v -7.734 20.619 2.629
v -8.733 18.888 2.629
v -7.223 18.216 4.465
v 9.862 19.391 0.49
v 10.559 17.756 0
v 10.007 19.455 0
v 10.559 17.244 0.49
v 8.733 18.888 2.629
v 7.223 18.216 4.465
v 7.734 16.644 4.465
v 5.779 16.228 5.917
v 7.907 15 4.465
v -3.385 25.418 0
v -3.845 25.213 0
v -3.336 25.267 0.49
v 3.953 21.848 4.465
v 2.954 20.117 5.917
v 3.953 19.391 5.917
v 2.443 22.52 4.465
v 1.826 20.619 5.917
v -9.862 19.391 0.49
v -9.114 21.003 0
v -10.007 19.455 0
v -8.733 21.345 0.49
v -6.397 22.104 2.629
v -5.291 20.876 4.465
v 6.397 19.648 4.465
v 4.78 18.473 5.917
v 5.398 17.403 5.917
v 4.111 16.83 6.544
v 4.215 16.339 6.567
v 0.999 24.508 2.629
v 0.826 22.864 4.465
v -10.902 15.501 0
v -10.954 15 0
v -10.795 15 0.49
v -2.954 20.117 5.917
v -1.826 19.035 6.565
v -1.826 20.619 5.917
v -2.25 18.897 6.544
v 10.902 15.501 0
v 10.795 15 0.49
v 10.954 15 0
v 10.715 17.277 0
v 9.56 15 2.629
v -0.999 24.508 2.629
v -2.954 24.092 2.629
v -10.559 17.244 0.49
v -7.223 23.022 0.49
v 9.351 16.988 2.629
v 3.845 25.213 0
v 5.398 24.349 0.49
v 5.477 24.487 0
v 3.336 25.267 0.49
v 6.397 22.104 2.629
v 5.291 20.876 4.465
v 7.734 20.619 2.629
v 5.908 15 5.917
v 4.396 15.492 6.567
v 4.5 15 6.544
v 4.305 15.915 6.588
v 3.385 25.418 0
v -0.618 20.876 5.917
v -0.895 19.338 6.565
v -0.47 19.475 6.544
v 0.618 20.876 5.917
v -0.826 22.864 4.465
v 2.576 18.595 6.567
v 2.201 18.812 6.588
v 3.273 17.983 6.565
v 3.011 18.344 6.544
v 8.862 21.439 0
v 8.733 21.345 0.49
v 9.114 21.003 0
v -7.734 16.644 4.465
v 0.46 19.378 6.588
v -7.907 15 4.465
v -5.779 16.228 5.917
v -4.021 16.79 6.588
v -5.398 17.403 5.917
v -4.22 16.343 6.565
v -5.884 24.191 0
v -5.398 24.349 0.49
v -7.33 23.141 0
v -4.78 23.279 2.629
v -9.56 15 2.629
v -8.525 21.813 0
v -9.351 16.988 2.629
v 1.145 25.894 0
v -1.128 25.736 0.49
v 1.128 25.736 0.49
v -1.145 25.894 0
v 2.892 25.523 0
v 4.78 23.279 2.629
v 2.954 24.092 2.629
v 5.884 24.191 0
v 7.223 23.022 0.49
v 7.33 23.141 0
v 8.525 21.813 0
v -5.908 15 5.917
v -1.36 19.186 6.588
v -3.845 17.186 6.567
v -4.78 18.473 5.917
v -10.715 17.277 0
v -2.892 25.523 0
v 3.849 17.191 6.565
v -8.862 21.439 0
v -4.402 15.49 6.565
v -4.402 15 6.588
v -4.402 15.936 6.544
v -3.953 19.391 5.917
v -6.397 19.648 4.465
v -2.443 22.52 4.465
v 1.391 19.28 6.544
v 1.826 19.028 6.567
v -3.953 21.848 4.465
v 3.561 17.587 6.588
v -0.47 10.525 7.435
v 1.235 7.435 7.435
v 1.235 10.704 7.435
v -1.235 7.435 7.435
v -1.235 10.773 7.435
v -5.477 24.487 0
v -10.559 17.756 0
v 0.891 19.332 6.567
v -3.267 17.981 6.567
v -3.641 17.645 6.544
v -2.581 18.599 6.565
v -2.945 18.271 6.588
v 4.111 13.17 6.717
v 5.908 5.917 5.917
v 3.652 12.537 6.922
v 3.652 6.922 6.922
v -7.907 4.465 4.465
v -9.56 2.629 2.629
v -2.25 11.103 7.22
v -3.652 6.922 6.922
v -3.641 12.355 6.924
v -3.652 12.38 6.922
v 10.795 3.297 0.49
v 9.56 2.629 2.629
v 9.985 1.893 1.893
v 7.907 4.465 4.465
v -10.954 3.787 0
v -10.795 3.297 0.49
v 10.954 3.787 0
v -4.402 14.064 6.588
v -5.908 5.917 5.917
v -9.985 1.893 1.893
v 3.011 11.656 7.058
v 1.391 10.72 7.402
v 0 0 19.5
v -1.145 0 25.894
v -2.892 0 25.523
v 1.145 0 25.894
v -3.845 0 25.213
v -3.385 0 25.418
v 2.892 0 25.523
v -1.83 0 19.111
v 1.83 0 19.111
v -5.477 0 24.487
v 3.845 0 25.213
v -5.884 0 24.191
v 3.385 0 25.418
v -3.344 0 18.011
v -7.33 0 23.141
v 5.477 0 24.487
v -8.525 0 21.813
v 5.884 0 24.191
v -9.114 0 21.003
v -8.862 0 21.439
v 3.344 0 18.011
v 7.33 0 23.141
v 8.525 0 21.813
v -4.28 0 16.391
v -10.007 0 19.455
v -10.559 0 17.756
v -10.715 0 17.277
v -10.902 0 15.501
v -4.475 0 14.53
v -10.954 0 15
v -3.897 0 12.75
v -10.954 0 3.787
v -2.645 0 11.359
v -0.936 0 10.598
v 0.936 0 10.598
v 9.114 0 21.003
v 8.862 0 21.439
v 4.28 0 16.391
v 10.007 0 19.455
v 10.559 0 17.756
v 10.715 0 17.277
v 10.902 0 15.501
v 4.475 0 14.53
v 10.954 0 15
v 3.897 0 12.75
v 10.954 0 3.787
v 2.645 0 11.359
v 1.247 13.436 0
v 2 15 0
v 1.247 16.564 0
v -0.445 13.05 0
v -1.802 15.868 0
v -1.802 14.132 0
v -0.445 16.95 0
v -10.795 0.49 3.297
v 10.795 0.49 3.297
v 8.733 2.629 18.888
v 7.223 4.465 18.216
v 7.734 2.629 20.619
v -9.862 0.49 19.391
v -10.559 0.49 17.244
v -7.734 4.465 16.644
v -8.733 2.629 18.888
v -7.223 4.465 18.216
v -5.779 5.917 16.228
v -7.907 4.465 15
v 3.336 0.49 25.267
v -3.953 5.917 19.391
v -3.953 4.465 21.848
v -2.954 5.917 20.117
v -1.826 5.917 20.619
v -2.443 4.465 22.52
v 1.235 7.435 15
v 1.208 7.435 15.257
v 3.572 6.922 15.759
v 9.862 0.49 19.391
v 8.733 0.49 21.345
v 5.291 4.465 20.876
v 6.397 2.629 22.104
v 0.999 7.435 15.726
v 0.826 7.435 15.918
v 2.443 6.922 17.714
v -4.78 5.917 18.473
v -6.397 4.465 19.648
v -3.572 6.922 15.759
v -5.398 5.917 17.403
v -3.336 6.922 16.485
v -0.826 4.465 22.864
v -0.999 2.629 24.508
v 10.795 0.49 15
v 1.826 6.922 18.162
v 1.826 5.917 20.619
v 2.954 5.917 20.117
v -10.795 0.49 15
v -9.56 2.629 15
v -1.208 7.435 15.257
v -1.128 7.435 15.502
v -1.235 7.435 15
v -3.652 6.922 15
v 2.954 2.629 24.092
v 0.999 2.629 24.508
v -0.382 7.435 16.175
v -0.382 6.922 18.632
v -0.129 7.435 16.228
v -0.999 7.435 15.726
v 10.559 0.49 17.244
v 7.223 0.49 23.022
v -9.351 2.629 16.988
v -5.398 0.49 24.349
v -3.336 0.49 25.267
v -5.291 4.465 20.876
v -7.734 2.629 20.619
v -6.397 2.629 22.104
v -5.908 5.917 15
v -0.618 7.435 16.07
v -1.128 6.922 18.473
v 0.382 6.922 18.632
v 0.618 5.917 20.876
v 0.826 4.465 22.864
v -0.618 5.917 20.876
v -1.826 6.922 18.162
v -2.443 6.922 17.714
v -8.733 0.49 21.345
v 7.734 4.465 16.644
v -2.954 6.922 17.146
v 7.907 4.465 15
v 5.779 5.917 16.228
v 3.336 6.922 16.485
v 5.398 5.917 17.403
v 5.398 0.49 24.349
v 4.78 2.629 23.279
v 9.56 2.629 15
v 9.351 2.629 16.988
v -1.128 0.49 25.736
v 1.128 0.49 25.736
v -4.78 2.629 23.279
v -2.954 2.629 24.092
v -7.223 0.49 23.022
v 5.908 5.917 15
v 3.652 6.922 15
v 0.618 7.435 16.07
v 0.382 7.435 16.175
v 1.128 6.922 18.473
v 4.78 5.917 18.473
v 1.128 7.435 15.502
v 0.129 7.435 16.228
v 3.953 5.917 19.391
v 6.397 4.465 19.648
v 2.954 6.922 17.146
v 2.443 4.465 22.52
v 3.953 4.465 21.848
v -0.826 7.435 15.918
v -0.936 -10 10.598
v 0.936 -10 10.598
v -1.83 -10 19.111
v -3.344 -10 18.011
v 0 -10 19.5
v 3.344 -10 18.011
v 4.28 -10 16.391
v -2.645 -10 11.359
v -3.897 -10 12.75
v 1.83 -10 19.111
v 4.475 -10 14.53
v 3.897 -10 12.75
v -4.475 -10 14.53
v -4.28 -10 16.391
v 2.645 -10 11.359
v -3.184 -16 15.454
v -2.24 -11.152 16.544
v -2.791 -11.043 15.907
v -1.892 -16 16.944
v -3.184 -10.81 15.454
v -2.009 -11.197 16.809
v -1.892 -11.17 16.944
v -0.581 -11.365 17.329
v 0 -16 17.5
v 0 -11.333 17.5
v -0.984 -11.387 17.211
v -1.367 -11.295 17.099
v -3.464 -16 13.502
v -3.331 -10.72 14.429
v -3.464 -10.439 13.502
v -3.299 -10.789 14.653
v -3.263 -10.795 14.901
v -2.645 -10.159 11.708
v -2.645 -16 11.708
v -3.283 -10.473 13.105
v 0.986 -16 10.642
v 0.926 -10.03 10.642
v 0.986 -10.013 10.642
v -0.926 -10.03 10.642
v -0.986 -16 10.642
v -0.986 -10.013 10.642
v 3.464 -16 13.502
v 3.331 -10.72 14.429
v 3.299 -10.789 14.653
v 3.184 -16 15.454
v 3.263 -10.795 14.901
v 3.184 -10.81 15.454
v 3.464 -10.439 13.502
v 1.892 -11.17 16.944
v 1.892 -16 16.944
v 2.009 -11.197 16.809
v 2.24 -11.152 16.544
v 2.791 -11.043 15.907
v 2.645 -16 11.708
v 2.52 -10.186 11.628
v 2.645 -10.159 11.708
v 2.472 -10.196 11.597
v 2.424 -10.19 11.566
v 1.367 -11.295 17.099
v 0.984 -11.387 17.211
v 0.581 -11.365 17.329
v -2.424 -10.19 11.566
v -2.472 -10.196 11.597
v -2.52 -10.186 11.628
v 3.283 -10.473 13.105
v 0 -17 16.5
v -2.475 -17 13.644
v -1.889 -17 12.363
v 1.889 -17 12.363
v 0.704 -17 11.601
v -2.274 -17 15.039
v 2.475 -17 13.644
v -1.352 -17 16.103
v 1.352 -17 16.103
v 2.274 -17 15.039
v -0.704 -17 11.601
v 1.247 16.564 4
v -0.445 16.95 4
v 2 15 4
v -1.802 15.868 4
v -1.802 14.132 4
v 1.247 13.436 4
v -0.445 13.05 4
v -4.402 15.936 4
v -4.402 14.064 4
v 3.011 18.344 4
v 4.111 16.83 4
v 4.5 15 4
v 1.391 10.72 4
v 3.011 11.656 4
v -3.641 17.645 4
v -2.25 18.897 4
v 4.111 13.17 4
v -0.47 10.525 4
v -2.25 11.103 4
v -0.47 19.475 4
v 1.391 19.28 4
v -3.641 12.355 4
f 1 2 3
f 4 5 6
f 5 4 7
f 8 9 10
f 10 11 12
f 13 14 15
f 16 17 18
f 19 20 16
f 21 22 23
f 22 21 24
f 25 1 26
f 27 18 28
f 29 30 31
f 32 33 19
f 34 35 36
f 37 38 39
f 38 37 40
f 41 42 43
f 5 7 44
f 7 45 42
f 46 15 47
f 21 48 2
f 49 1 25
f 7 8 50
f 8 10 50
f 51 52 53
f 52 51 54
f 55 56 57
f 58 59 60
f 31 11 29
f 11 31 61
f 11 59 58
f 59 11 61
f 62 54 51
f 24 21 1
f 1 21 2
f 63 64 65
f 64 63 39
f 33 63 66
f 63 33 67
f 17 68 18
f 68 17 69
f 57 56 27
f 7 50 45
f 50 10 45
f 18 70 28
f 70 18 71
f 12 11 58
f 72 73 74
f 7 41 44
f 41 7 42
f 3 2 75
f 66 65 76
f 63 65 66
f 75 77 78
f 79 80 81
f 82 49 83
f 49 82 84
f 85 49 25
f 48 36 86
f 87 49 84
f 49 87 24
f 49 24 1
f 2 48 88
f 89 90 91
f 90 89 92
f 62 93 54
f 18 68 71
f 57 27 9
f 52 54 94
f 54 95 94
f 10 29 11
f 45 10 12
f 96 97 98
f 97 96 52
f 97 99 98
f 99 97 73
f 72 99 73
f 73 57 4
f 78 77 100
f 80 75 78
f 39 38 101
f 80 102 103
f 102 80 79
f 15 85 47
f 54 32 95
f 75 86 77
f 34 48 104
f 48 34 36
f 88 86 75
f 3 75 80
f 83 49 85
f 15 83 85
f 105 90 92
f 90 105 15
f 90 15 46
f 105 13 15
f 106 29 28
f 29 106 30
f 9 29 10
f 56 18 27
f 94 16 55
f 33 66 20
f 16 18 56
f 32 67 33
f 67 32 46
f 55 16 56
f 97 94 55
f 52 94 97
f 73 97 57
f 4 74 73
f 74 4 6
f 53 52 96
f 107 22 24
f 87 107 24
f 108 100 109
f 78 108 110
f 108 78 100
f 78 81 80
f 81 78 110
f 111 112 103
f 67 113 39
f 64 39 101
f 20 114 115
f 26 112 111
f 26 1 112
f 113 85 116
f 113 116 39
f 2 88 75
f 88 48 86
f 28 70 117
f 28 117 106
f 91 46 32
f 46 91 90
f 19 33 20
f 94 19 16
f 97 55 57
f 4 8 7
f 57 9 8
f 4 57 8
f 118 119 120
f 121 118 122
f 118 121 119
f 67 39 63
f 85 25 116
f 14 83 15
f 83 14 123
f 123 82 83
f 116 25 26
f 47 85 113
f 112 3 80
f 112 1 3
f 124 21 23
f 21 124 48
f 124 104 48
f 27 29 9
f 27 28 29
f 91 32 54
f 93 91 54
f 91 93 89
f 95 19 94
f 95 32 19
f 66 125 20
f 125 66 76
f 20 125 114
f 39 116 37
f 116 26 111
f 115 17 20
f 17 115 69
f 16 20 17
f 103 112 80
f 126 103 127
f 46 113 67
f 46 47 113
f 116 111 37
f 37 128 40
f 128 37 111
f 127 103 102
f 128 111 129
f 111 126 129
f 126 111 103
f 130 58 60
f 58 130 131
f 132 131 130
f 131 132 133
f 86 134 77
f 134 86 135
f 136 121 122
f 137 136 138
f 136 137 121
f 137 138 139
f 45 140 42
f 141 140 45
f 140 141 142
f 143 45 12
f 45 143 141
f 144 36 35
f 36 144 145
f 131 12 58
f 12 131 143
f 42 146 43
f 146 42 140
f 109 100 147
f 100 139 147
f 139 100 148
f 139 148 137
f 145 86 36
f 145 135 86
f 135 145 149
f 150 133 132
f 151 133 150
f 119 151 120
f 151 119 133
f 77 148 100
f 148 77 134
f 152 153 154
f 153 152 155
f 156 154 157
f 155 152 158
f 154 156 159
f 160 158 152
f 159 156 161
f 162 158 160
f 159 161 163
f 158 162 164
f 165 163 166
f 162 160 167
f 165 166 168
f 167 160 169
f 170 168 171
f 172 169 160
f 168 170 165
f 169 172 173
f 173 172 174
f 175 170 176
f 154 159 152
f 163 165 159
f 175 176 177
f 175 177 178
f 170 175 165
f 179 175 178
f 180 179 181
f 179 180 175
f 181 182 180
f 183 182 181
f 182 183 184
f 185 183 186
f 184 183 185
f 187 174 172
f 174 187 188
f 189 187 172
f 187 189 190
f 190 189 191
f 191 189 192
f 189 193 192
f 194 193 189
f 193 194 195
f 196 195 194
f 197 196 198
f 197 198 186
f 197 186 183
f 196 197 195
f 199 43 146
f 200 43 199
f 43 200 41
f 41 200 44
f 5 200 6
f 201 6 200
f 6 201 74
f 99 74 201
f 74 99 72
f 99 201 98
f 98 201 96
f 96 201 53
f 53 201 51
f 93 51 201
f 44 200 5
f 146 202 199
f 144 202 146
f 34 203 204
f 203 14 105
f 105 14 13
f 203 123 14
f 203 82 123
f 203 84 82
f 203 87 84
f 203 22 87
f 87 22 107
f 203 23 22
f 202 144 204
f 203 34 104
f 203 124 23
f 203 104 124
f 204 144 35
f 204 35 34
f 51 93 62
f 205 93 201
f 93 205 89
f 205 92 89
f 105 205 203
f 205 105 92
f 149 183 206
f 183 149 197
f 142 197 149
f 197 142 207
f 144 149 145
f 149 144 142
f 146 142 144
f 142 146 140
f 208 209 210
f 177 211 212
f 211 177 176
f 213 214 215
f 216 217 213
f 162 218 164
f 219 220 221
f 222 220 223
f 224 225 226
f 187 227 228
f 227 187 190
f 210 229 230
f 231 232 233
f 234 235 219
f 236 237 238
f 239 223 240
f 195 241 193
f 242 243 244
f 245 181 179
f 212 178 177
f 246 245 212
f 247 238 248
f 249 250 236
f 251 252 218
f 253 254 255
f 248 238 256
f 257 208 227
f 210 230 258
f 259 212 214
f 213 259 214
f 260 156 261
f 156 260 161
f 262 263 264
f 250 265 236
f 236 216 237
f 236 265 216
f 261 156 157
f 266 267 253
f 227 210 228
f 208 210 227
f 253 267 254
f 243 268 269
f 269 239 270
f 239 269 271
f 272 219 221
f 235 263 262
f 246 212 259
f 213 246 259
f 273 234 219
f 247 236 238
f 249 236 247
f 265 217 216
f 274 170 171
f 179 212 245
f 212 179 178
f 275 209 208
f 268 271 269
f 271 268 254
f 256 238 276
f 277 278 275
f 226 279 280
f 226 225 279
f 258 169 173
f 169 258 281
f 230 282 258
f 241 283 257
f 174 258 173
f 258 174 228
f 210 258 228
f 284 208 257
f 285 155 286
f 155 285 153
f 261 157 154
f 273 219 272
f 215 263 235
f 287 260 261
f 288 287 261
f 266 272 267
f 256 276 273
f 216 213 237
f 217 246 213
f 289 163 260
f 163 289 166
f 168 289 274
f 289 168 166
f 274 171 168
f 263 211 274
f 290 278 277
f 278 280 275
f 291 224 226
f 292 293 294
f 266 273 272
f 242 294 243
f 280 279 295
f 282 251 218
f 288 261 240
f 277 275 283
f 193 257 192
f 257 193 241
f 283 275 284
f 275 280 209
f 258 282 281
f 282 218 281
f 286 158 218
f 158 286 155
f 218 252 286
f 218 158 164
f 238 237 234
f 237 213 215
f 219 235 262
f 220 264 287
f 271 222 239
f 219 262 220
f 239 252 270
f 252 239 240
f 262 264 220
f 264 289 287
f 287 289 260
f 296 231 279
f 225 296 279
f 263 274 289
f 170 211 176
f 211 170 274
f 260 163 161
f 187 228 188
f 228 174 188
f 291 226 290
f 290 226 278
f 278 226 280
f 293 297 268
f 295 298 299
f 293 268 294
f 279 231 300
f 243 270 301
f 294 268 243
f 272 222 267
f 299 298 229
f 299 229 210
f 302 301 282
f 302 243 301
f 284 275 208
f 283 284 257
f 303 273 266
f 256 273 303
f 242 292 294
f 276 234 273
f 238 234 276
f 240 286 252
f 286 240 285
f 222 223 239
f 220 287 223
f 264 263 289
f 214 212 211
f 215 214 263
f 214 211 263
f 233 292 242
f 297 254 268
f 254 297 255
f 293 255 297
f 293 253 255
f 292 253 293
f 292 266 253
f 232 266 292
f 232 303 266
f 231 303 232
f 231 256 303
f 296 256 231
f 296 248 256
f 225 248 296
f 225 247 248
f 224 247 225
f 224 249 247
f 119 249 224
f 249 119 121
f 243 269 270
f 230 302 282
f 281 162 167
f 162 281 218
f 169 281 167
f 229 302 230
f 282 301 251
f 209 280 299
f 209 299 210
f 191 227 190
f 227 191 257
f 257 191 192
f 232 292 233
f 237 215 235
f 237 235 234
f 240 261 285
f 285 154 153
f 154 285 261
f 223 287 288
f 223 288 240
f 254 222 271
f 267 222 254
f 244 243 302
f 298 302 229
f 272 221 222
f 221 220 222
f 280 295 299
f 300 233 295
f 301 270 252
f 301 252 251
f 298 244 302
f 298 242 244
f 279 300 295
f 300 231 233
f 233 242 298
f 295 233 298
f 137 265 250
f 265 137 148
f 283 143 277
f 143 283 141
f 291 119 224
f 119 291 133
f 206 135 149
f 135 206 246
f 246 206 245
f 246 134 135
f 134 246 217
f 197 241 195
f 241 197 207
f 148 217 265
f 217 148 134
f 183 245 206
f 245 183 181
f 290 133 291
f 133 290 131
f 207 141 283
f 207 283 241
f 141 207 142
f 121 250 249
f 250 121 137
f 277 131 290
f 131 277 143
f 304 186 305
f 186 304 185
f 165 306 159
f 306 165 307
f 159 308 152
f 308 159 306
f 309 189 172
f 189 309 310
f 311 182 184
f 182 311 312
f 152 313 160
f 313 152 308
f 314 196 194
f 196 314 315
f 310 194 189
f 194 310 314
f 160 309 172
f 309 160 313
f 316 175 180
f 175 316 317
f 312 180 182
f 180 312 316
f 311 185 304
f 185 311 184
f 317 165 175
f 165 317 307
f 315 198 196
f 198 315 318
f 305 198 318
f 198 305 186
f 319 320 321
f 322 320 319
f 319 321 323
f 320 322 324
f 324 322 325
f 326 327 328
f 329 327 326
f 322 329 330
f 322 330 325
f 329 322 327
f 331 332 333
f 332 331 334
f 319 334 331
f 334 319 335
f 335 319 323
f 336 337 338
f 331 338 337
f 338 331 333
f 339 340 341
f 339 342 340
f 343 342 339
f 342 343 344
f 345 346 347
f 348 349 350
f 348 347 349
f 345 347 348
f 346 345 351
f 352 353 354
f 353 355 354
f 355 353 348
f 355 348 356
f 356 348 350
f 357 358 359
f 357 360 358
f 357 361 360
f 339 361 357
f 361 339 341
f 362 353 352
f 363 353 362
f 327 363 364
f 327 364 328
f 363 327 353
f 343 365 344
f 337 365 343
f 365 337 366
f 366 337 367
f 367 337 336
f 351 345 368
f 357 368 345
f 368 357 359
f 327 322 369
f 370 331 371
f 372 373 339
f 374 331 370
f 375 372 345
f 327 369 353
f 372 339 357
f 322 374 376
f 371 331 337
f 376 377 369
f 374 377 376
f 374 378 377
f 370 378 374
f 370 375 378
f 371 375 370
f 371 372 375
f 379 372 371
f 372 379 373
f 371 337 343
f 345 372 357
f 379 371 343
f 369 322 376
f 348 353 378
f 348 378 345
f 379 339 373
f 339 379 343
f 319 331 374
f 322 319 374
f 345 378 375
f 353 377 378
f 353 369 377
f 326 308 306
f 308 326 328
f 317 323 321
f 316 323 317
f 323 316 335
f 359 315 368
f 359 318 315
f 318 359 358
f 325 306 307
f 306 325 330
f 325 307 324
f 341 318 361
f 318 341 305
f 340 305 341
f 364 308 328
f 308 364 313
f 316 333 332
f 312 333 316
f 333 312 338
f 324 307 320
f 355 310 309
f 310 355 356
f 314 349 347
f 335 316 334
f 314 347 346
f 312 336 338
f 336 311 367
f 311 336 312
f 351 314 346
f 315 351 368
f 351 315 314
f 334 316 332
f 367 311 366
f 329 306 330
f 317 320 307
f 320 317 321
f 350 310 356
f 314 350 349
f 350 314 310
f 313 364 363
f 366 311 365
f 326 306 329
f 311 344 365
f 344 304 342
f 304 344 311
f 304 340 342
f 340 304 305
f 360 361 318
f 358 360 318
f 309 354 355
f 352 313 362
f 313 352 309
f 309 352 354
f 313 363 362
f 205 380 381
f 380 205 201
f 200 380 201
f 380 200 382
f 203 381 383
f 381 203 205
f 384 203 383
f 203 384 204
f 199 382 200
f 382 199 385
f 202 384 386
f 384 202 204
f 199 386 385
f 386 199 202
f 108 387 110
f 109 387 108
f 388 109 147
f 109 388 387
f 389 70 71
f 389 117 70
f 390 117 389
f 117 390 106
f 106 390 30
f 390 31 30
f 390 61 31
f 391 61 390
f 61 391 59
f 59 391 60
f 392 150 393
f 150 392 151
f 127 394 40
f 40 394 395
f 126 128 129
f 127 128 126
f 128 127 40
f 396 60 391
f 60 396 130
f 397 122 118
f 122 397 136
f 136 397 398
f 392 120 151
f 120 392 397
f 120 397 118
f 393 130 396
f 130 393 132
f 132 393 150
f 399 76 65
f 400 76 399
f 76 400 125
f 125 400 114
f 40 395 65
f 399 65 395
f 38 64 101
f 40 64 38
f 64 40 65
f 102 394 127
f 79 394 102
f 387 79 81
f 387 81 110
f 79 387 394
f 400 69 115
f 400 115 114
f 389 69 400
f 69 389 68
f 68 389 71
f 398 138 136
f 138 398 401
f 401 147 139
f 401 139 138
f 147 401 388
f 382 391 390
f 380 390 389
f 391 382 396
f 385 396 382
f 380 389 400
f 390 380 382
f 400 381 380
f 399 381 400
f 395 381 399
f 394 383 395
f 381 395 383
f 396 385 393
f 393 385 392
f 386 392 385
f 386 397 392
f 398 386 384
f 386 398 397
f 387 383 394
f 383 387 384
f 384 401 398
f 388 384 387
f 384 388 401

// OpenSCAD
//              +++++++++++++
//        +         |   |-h       +
//     +------------+   +------------+
//   +      r       |   |              +
//  +               |   |-radius        +
//  ----------------+   +----------------
//                          |radius
//
// (radius - height)² + r² = (radius)²
// radius² -2*height*radius + height² + r² = radius²
// 2*height*radius = height² + r²
// radius = (height² + r²) / (2 * height)
//

height    = 7.5;
r         = 11;
radius    = ((height * height) + (r * r)) / (2 * height);
cylh      = 15;
slantin   = 5;
slant     = pow (2 * slantin * slantin, 0.5);
eps       = 0;
hole_r1   = 2;
hole_r2   = 4.5;
height_h2 = 4;
cyl1_r    = 4.5;
cyl2_r    = 3.5;

module rounded_part () {
    translate ([0, cylh, 0])
    difference () {
        translate ([0, 0, -radius + height])
            union () {
                sphere (radius);
                rotate (90, [1, 0, 0])
                    cylinder (h=cylh, r = radius);
            }
        translate ([0, 0, -2 * radius])
            cube (4 * radius + eps, center = true);
        translate ([0, -(cylh + 2 * radius), 0])
            cube (4 * radius + eps, center = true);
        rotate (45, [1, 0, 0])
            translate ([0, -(cylh + 2 * radius) + slant, 0])
                cube (4 * radius + eps, center = true);
    }
}

difference () {
    union () {
        rounded_part ();
        rotate (-90, [1, 0, 0])
            rotate (180, [0, 0, 1])
                rounded_part ();
        translate ([0, 0, cylh])
            rotate (90, [1, 0, 0])
                rotate (90, [0, 0, 1])
                    union () {
                        cylinder (h=10, r=cyl1_r);
                        translate ([-1, 0, 0])
                            cylinder (h=16, r=cyl2_r);
                        translate ([-1, 0, 16])
                            cylinder (h=1, r1=cyl2_r, r2=cyl2_r - 1);
                        translate ([0, 0, 10])
                            cylinder (h=2, r1=cyl1_r, r2=cyl2_r - 2);
                    }
    }
    translate ([0, cylh, -height])
        cylinder (h = 2 * height, r=hole_r1);
    translate ([0, cylh, height_h2])
        cylinder (h = height, r=hole_r2);
}
